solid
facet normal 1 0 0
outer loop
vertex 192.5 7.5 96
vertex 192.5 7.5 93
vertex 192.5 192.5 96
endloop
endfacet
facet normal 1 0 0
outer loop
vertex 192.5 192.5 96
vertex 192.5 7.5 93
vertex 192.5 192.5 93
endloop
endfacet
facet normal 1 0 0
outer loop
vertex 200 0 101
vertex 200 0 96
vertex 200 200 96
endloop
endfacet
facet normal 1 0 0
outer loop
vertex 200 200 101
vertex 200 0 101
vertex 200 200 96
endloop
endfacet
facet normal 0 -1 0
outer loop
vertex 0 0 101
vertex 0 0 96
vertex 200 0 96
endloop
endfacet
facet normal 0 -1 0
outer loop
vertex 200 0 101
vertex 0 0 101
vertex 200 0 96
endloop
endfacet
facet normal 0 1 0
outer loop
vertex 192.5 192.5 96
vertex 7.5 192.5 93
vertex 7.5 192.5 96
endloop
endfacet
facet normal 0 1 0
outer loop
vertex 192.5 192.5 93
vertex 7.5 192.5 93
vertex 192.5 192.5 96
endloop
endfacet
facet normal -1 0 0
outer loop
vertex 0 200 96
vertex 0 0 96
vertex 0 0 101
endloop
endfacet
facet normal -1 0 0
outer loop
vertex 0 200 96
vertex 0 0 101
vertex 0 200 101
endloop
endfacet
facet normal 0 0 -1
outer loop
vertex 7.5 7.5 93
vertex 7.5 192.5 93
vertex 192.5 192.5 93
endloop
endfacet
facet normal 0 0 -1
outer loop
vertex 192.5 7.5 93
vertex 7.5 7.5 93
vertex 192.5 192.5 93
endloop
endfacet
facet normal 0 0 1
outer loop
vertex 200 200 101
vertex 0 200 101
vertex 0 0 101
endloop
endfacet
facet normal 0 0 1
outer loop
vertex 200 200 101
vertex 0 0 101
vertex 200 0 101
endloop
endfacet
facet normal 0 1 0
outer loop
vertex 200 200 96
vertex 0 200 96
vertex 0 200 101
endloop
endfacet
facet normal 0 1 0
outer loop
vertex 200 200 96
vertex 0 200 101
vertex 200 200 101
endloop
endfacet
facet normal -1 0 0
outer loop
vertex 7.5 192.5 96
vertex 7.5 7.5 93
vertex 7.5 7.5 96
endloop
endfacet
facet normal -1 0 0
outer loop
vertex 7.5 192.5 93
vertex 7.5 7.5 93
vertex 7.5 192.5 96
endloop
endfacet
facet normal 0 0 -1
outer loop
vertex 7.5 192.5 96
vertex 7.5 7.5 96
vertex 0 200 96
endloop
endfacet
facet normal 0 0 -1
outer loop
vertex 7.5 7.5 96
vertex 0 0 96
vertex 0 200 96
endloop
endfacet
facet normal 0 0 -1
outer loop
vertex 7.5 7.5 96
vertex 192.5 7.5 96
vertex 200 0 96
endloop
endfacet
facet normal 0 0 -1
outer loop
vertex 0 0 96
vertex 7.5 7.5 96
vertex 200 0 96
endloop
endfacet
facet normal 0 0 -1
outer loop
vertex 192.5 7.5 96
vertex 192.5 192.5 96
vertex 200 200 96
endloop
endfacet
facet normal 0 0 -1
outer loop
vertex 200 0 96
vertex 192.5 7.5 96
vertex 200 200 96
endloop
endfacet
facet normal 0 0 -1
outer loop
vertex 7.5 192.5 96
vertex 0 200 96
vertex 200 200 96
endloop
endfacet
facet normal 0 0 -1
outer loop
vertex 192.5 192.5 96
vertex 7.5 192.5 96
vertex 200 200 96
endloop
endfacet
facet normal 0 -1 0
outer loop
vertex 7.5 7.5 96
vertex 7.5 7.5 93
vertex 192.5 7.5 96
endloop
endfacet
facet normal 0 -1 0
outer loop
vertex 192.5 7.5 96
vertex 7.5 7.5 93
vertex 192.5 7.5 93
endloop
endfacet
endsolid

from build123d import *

# Parameters (mm, degrees)
BOX006_W     = 185
BOX006_H     = 185
BOX006_DEPTH = 8
BOX005_W     = 200
BOX005_H     = 200
BOX005_DEPTH = 5


with BuildPart() as cube006:
    # Box006 → Box006 (new body)
    with BuildSketch(Plane(origin=(7.5, 7.5, 93), x_dir=(1, 0, 0), z_dir=(0, 0, 1))):
        with Locations((92.5, 92.5)):
            Rectangle(BOX006_W, BOX006_H)
    extrude(amount=BOX006_DEPTH)


with BuildPart() as lid:
    # Box005 → Box005 (new body)
    with BuildSketch(Plane.XY.offset(96)):
        with Locations((100, 100)):
            Rectangle(BOX005_W, BOX005_H)
    extrude(amount=BOX005_DEPTH)

    # Fusion002: union Cube006
    add(cube006.part)


solid = lid.part
